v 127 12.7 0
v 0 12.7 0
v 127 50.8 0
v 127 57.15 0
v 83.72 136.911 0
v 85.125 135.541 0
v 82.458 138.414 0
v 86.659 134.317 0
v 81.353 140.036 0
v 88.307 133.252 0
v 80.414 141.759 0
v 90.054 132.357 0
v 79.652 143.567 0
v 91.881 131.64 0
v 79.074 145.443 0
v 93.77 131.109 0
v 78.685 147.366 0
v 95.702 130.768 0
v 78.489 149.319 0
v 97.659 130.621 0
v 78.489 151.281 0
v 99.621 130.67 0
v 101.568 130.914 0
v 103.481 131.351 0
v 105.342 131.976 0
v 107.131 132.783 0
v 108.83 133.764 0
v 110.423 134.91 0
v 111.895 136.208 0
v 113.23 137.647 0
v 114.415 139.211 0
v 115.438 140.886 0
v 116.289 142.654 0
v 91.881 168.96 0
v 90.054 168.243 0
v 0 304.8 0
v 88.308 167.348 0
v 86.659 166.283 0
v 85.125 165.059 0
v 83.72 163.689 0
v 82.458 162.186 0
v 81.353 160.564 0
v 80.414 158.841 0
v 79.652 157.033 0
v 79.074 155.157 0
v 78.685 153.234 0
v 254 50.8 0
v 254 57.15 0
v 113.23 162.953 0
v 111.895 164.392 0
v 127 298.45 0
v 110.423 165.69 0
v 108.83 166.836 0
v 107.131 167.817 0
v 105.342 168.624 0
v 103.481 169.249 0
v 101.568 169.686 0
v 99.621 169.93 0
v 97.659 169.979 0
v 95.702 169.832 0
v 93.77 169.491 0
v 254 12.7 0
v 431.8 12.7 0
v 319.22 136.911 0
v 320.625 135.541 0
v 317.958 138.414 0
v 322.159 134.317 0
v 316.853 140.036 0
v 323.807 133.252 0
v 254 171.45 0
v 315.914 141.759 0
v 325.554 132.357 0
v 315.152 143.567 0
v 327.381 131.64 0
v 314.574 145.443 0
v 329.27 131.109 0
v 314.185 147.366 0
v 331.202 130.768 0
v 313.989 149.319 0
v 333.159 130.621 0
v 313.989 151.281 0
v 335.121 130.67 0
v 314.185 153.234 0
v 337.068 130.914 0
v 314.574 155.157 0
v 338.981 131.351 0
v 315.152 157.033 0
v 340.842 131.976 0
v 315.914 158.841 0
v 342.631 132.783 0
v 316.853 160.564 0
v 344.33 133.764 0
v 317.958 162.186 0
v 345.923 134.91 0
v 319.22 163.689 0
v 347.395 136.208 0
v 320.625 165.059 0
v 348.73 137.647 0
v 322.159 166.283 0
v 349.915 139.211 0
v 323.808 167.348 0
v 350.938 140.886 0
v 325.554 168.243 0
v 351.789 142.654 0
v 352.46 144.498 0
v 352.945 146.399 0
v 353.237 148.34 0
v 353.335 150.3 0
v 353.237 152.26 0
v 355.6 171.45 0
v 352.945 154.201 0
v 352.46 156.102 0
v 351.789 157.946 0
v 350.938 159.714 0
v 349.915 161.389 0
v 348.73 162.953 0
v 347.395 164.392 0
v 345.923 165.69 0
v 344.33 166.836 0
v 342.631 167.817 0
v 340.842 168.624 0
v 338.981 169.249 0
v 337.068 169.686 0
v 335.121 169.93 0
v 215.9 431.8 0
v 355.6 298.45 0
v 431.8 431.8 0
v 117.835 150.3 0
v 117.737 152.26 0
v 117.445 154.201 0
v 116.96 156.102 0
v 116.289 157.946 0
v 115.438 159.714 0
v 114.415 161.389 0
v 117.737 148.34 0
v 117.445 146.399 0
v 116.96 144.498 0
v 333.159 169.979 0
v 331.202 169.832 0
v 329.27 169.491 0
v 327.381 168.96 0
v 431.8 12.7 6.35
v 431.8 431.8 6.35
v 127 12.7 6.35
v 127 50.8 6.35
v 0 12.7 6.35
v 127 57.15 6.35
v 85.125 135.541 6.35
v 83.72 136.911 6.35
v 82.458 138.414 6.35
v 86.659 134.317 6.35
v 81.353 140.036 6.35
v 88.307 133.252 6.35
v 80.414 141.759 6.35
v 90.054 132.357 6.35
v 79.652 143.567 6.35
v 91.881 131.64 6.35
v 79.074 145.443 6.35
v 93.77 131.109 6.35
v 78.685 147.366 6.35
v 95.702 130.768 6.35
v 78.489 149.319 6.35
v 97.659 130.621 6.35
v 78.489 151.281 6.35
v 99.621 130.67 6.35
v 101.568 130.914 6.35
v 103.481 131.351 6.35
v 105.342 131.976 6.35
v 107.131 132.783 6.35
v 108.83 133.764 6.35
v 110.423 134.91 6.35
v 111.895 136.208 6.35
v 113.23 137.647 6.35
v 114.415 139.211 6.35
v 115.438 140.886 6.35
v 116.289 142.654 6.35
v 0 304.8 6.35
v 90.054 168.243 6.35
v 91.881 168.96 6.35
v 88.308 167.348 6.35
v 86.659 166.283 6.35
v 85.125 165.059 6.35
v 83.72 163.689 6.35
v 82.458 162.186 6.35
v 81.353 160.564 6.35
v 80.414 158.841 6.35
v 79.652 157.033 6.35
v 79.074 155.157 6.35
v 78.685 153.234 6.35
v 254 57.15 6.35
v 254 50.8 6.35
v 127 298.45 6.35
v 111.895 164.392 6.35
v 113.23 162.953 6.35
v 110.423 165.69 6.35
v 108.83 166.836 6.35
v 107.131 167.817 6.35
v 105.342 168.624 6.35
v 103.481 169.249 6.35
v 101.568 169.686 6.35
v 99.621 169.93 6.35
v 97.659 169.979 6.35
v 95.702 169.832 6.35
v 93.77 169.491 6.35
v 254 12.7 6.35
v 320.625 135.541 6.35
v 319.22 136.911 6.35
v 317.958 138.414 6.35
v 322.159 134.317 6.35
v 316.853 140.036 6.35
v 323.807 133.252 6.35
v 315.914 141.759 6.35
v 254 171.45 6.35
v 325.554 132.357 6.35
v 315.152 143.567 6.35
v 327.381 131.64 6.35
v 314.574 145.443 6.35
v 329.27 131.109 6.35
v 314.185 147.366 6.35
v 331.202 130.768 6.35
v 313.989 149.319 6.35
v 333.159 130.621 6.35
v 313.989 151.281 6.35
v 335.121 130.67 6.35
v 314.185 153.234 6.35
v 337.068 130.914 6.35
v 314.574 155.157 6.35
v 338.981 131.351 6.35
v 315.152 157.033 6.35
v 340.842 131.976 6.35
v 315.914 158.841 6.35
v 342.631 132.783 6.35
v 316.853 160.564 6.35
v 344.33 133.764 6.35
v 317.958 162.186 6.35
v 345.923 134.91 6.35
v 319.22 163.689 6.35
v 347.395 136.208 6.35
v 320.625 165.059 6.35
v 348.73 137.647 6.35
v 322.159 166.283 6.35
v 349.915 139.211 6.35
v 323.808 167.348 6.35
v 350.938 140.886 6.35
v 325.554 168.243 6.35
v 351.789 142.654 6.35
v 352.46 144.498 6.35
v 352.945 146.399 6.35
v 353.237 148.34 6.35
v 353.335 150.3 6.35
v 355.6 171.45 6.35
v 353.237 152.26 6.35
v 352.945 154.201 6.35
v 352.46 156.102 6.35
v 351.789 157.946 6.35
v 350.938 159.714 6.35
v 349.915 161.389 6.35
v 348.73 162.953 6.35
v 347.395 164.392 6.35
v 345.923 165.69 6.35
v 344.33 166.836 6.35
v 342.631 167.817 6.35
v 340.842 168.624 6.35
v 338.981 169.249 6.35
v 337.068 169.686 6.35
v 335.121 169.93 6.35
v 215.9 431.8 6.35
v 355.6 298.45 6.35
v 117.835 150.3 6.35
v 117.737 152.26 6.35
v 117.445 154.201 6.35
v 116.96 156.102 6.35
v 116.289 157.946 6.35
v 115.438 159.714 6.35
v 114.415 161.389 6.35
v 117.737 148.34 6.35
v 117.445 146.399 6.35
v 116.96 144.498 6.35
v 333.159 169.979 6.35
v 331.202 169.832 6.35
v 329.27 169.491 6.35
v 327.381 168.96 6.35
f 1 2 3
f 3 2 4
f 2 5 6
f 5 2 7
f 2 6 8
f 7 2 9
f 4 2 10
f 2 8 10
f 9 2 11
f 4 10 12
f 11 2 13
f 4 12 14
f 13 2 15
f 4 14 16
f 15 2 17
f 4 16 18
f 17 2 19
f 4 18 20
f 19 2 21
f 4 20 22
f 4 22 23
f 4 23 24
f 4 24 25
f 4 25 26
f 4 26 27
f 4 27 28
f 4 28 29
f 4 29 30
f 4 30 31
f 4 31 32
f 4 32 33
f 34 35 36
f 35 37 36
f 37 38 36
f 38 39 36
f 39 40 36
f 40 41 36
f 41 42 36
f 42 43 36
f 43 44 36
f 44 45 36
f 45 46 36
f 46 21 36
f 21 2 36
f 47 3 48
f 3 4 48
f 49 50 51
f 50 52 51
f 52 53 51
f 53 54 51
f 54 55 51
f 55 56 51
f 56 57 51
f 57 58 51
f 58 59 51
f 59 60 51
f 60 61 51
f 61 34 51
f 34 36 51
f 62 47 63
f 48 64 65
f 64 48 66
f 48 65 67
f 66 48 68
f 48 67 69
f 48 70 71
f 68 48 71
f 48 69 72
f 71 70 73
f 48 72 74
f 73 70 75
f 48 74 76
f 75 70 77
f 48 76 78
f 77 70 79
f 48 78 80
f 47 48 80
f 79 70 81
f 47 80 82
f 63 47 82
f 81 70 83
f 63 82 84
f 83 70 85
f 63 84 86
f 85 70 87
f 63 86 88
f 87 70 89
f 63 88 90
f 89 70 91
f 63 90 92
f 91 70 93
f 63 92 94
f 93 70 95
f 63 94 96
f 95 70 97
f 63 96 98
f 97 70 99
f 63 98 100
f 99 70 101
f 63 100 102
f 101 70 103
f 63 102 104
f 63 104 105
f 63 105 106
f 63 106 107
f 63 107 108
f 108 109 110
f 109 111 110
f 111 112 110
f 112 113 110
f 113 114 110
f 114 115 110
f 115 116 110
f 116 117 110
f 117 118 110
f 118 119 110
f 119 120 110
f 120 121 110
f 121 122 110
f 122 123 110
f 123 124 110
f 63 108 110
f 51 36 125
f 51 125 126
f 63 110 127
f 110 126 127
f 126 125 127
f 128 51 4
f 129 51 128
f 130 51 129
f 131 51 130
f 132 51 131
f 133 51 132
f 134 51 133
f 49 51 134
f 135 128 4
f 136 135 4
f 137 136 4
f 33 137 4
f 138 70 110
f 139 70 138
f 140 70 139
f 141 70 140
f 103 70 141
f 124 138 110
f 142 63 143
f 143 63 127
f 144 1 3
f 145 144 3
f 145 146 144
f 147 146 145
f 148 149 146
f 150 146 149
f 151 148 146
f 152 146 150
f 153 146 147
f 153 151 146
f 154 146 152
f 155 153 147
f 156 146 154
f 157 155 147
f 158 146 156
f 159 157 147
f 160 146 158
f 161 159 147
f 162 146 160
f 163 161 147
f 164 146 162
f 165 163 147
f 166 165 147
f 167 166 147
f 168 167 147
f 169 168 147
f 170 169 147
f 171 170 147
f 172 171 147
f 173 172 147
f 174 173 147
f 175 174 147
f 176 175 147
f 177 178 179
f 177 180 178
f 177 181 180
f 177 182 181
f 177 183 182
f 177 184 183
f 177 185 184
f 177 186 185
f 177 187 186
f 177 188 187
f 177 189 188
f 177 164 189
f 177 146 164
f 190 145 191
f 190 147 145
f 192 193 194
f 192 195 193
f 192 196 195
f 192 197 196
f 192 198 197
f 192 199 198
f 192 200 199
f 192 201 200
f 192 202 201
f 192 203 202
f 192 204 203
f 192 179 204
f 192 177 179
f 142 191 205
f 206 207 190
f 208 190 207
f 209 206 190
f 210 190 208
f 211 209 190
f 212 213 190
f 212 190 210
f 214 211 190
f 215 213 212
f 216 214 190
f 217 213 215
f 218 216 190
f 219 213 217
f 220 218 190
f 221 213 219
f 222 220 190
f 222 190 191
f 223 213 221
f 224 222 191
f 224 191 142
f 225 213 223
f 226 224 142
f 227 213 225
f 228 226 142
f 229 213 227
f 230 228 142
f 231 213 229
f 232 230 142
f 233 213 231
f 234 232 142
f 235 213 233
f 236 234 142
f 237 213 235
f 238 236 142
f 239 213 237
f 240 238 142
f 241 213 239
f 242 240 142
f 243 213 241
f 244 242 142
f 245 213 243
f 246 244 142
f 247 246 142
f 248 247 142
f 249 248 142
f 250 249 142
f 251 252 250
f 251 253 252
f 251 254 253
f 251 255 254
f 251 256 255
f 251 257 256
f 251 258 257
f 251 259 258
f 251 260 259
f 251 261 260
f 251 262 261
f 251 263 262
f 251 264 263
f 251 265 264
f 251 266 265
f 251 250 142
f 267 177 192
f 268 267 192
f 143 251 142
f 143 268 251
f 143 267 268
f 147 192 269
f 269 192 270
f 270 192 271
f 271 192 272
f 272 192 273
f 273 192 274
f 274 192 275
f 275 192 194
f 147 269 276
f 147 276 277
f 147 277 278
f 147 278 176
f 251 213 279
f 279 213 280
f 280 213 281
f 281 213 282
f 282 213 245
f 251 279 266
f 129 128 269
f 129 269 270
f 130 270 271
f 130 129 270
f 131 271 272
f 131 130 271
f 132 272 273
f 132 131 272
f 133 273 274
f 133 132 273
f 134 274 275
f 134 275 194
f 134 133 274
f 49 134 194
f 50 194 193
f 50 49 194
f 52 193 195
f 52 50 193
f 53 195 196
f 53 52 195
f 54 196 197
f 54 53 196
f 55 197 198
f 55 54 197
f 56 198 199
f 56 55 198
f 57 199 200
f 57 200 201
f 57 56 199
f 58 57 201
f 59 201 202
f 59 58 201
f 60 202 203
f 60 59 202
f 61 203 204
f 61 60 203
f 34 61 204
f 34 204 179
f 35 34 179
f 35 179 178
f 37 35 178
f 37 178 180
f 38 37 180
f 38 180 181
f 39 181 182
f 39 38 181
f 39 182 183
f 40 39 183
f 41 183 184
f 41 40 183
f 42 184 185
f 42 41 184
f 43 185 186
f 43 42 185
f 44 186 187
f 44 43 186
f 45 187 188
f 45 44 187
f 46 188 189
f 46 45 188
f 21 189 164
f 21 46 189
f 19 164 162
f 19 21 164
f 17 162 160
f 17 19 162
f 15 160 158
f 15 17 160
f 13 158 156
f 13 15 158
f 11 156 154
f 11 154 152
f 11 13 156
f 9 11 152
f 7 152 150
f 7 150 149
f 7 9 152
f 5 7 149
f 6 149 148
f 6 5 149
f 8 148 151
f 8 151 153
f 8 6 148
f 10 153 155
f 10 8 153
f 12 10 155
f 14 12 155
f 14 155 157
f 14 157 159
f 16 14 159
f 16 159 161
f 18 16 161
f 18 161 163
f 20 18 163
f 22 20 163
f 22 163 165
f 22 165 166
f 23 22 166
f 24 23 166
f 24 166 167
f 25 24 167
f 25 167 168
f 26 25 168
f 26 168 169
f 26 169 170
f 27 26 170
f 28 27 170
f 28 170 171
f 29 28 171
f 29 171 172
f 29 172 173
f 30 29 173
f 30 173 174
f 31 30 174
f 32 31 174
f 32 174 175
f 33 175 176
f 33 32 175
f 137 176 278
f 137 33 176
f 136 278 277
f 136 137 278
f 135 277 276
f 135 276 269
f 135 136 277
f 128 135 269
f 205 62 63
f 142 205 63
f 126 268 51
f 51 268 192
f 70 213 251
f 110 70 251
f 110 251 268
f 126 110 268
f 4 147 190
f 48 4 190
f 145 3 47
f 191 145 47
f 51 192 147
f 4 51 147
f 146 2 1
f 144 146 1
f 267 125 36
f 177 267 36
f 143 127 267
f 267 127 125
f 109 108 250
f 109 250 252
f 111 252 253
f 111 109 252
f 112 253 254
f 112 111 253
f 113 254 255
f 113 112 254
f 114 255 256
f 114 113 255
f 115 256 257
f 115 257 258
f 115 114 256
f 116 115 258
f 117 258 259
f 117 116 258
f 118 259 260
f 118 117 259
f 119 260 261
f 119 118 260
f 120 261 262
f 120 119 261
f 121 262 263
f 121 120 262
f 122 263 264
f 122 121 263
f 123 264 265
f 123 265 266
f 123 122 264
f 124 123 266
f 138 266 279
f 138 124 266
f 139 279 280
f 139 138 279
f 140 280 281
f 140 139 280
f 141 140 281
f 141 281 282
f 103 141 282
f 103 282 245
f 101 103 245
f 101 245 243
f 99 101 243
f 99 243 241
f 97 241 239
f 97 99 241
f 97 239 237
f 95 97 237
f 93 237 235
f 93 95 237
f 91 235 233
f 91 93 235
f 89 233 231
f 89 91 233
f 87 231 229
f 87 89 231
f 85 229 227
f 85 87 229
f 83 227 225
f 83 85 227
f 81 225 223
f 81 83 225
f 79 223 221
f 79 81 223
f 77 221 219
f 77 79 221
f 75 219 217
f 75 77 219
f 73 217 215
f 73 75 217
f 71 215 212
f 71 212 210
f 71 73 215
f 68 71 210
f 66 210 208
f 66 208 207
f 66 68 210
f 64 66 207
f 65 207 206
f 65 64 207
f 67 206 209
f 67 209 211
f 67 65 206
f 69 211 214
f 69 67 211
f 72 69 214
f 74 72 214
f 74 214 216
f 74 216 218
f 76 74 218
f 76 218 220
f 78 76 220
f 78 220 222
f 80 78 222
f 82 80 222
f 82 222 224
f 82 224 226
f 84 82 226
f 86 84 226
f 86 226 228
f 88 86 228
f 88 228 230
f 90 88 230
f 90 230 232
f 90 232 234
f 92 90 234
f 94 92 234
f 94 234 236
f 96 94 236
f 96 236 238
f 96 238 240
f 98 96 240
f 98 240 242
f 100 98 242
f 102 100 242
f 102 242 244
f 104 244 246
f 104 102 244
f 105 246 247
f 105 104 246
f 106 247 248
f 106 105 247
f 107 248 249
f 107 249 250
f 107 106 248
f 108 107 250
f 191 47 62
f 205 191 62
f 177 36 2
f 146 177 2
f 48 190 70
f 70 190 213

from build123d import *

# Parameters (mm, degrees)
FRAME_EXTERIOR_MASTER_OUTLINE_R = 19.685
FRAME_EXTERIOR_MASTER_DEPTH     = 6.35
CUT_EXTRUDE1_DEPTH              = 611.690430988


# Read off the part's stored shape, not the designer's step: Frame Exterior Master
with BuildPart() as part:
    # Frame Exterior Master outline → Frame Exterior Master (new body)
    with BuildSketch(Plane.XY):
        Polygon((431.8, 12.7), (431.8, 431.8), (215.9, 431.8), (0, 304.8), (0, 12.7), (127, 12.7), (127, 50.8), (254, 50.8), (254, 12.7), align=None)
        with Locations((98.15, 150.3)):
            Circle(FRAME_EXTERIOR_MASTER_OUTLINE_R, mode=Mode.SUBTRACT)
        with Locations((333.65, 150.3)):
            Circle(FRAME_EXTERIOR_MASTER_OUTLINE_R, mode=Mode.SUBTRACT)
    extrude(amount=FRAME_EXTERIOR_MASTER_DEPTH)

    # Sketch1 → Cut-Extrude1 (cut, through all)
    with BuildSketch(Plane.XY.offset(6.35)):
        Polygon((127, 298.45), (127, 57.15), (254, 57.15), (254, 171.45), (355.6, 171.45), (355.6, 298.45), align=None)
    extrude(amount=-CUT_EXTRUDE1_DEPTH, mode=Mode.SUBTRACT)


solid = part.part
